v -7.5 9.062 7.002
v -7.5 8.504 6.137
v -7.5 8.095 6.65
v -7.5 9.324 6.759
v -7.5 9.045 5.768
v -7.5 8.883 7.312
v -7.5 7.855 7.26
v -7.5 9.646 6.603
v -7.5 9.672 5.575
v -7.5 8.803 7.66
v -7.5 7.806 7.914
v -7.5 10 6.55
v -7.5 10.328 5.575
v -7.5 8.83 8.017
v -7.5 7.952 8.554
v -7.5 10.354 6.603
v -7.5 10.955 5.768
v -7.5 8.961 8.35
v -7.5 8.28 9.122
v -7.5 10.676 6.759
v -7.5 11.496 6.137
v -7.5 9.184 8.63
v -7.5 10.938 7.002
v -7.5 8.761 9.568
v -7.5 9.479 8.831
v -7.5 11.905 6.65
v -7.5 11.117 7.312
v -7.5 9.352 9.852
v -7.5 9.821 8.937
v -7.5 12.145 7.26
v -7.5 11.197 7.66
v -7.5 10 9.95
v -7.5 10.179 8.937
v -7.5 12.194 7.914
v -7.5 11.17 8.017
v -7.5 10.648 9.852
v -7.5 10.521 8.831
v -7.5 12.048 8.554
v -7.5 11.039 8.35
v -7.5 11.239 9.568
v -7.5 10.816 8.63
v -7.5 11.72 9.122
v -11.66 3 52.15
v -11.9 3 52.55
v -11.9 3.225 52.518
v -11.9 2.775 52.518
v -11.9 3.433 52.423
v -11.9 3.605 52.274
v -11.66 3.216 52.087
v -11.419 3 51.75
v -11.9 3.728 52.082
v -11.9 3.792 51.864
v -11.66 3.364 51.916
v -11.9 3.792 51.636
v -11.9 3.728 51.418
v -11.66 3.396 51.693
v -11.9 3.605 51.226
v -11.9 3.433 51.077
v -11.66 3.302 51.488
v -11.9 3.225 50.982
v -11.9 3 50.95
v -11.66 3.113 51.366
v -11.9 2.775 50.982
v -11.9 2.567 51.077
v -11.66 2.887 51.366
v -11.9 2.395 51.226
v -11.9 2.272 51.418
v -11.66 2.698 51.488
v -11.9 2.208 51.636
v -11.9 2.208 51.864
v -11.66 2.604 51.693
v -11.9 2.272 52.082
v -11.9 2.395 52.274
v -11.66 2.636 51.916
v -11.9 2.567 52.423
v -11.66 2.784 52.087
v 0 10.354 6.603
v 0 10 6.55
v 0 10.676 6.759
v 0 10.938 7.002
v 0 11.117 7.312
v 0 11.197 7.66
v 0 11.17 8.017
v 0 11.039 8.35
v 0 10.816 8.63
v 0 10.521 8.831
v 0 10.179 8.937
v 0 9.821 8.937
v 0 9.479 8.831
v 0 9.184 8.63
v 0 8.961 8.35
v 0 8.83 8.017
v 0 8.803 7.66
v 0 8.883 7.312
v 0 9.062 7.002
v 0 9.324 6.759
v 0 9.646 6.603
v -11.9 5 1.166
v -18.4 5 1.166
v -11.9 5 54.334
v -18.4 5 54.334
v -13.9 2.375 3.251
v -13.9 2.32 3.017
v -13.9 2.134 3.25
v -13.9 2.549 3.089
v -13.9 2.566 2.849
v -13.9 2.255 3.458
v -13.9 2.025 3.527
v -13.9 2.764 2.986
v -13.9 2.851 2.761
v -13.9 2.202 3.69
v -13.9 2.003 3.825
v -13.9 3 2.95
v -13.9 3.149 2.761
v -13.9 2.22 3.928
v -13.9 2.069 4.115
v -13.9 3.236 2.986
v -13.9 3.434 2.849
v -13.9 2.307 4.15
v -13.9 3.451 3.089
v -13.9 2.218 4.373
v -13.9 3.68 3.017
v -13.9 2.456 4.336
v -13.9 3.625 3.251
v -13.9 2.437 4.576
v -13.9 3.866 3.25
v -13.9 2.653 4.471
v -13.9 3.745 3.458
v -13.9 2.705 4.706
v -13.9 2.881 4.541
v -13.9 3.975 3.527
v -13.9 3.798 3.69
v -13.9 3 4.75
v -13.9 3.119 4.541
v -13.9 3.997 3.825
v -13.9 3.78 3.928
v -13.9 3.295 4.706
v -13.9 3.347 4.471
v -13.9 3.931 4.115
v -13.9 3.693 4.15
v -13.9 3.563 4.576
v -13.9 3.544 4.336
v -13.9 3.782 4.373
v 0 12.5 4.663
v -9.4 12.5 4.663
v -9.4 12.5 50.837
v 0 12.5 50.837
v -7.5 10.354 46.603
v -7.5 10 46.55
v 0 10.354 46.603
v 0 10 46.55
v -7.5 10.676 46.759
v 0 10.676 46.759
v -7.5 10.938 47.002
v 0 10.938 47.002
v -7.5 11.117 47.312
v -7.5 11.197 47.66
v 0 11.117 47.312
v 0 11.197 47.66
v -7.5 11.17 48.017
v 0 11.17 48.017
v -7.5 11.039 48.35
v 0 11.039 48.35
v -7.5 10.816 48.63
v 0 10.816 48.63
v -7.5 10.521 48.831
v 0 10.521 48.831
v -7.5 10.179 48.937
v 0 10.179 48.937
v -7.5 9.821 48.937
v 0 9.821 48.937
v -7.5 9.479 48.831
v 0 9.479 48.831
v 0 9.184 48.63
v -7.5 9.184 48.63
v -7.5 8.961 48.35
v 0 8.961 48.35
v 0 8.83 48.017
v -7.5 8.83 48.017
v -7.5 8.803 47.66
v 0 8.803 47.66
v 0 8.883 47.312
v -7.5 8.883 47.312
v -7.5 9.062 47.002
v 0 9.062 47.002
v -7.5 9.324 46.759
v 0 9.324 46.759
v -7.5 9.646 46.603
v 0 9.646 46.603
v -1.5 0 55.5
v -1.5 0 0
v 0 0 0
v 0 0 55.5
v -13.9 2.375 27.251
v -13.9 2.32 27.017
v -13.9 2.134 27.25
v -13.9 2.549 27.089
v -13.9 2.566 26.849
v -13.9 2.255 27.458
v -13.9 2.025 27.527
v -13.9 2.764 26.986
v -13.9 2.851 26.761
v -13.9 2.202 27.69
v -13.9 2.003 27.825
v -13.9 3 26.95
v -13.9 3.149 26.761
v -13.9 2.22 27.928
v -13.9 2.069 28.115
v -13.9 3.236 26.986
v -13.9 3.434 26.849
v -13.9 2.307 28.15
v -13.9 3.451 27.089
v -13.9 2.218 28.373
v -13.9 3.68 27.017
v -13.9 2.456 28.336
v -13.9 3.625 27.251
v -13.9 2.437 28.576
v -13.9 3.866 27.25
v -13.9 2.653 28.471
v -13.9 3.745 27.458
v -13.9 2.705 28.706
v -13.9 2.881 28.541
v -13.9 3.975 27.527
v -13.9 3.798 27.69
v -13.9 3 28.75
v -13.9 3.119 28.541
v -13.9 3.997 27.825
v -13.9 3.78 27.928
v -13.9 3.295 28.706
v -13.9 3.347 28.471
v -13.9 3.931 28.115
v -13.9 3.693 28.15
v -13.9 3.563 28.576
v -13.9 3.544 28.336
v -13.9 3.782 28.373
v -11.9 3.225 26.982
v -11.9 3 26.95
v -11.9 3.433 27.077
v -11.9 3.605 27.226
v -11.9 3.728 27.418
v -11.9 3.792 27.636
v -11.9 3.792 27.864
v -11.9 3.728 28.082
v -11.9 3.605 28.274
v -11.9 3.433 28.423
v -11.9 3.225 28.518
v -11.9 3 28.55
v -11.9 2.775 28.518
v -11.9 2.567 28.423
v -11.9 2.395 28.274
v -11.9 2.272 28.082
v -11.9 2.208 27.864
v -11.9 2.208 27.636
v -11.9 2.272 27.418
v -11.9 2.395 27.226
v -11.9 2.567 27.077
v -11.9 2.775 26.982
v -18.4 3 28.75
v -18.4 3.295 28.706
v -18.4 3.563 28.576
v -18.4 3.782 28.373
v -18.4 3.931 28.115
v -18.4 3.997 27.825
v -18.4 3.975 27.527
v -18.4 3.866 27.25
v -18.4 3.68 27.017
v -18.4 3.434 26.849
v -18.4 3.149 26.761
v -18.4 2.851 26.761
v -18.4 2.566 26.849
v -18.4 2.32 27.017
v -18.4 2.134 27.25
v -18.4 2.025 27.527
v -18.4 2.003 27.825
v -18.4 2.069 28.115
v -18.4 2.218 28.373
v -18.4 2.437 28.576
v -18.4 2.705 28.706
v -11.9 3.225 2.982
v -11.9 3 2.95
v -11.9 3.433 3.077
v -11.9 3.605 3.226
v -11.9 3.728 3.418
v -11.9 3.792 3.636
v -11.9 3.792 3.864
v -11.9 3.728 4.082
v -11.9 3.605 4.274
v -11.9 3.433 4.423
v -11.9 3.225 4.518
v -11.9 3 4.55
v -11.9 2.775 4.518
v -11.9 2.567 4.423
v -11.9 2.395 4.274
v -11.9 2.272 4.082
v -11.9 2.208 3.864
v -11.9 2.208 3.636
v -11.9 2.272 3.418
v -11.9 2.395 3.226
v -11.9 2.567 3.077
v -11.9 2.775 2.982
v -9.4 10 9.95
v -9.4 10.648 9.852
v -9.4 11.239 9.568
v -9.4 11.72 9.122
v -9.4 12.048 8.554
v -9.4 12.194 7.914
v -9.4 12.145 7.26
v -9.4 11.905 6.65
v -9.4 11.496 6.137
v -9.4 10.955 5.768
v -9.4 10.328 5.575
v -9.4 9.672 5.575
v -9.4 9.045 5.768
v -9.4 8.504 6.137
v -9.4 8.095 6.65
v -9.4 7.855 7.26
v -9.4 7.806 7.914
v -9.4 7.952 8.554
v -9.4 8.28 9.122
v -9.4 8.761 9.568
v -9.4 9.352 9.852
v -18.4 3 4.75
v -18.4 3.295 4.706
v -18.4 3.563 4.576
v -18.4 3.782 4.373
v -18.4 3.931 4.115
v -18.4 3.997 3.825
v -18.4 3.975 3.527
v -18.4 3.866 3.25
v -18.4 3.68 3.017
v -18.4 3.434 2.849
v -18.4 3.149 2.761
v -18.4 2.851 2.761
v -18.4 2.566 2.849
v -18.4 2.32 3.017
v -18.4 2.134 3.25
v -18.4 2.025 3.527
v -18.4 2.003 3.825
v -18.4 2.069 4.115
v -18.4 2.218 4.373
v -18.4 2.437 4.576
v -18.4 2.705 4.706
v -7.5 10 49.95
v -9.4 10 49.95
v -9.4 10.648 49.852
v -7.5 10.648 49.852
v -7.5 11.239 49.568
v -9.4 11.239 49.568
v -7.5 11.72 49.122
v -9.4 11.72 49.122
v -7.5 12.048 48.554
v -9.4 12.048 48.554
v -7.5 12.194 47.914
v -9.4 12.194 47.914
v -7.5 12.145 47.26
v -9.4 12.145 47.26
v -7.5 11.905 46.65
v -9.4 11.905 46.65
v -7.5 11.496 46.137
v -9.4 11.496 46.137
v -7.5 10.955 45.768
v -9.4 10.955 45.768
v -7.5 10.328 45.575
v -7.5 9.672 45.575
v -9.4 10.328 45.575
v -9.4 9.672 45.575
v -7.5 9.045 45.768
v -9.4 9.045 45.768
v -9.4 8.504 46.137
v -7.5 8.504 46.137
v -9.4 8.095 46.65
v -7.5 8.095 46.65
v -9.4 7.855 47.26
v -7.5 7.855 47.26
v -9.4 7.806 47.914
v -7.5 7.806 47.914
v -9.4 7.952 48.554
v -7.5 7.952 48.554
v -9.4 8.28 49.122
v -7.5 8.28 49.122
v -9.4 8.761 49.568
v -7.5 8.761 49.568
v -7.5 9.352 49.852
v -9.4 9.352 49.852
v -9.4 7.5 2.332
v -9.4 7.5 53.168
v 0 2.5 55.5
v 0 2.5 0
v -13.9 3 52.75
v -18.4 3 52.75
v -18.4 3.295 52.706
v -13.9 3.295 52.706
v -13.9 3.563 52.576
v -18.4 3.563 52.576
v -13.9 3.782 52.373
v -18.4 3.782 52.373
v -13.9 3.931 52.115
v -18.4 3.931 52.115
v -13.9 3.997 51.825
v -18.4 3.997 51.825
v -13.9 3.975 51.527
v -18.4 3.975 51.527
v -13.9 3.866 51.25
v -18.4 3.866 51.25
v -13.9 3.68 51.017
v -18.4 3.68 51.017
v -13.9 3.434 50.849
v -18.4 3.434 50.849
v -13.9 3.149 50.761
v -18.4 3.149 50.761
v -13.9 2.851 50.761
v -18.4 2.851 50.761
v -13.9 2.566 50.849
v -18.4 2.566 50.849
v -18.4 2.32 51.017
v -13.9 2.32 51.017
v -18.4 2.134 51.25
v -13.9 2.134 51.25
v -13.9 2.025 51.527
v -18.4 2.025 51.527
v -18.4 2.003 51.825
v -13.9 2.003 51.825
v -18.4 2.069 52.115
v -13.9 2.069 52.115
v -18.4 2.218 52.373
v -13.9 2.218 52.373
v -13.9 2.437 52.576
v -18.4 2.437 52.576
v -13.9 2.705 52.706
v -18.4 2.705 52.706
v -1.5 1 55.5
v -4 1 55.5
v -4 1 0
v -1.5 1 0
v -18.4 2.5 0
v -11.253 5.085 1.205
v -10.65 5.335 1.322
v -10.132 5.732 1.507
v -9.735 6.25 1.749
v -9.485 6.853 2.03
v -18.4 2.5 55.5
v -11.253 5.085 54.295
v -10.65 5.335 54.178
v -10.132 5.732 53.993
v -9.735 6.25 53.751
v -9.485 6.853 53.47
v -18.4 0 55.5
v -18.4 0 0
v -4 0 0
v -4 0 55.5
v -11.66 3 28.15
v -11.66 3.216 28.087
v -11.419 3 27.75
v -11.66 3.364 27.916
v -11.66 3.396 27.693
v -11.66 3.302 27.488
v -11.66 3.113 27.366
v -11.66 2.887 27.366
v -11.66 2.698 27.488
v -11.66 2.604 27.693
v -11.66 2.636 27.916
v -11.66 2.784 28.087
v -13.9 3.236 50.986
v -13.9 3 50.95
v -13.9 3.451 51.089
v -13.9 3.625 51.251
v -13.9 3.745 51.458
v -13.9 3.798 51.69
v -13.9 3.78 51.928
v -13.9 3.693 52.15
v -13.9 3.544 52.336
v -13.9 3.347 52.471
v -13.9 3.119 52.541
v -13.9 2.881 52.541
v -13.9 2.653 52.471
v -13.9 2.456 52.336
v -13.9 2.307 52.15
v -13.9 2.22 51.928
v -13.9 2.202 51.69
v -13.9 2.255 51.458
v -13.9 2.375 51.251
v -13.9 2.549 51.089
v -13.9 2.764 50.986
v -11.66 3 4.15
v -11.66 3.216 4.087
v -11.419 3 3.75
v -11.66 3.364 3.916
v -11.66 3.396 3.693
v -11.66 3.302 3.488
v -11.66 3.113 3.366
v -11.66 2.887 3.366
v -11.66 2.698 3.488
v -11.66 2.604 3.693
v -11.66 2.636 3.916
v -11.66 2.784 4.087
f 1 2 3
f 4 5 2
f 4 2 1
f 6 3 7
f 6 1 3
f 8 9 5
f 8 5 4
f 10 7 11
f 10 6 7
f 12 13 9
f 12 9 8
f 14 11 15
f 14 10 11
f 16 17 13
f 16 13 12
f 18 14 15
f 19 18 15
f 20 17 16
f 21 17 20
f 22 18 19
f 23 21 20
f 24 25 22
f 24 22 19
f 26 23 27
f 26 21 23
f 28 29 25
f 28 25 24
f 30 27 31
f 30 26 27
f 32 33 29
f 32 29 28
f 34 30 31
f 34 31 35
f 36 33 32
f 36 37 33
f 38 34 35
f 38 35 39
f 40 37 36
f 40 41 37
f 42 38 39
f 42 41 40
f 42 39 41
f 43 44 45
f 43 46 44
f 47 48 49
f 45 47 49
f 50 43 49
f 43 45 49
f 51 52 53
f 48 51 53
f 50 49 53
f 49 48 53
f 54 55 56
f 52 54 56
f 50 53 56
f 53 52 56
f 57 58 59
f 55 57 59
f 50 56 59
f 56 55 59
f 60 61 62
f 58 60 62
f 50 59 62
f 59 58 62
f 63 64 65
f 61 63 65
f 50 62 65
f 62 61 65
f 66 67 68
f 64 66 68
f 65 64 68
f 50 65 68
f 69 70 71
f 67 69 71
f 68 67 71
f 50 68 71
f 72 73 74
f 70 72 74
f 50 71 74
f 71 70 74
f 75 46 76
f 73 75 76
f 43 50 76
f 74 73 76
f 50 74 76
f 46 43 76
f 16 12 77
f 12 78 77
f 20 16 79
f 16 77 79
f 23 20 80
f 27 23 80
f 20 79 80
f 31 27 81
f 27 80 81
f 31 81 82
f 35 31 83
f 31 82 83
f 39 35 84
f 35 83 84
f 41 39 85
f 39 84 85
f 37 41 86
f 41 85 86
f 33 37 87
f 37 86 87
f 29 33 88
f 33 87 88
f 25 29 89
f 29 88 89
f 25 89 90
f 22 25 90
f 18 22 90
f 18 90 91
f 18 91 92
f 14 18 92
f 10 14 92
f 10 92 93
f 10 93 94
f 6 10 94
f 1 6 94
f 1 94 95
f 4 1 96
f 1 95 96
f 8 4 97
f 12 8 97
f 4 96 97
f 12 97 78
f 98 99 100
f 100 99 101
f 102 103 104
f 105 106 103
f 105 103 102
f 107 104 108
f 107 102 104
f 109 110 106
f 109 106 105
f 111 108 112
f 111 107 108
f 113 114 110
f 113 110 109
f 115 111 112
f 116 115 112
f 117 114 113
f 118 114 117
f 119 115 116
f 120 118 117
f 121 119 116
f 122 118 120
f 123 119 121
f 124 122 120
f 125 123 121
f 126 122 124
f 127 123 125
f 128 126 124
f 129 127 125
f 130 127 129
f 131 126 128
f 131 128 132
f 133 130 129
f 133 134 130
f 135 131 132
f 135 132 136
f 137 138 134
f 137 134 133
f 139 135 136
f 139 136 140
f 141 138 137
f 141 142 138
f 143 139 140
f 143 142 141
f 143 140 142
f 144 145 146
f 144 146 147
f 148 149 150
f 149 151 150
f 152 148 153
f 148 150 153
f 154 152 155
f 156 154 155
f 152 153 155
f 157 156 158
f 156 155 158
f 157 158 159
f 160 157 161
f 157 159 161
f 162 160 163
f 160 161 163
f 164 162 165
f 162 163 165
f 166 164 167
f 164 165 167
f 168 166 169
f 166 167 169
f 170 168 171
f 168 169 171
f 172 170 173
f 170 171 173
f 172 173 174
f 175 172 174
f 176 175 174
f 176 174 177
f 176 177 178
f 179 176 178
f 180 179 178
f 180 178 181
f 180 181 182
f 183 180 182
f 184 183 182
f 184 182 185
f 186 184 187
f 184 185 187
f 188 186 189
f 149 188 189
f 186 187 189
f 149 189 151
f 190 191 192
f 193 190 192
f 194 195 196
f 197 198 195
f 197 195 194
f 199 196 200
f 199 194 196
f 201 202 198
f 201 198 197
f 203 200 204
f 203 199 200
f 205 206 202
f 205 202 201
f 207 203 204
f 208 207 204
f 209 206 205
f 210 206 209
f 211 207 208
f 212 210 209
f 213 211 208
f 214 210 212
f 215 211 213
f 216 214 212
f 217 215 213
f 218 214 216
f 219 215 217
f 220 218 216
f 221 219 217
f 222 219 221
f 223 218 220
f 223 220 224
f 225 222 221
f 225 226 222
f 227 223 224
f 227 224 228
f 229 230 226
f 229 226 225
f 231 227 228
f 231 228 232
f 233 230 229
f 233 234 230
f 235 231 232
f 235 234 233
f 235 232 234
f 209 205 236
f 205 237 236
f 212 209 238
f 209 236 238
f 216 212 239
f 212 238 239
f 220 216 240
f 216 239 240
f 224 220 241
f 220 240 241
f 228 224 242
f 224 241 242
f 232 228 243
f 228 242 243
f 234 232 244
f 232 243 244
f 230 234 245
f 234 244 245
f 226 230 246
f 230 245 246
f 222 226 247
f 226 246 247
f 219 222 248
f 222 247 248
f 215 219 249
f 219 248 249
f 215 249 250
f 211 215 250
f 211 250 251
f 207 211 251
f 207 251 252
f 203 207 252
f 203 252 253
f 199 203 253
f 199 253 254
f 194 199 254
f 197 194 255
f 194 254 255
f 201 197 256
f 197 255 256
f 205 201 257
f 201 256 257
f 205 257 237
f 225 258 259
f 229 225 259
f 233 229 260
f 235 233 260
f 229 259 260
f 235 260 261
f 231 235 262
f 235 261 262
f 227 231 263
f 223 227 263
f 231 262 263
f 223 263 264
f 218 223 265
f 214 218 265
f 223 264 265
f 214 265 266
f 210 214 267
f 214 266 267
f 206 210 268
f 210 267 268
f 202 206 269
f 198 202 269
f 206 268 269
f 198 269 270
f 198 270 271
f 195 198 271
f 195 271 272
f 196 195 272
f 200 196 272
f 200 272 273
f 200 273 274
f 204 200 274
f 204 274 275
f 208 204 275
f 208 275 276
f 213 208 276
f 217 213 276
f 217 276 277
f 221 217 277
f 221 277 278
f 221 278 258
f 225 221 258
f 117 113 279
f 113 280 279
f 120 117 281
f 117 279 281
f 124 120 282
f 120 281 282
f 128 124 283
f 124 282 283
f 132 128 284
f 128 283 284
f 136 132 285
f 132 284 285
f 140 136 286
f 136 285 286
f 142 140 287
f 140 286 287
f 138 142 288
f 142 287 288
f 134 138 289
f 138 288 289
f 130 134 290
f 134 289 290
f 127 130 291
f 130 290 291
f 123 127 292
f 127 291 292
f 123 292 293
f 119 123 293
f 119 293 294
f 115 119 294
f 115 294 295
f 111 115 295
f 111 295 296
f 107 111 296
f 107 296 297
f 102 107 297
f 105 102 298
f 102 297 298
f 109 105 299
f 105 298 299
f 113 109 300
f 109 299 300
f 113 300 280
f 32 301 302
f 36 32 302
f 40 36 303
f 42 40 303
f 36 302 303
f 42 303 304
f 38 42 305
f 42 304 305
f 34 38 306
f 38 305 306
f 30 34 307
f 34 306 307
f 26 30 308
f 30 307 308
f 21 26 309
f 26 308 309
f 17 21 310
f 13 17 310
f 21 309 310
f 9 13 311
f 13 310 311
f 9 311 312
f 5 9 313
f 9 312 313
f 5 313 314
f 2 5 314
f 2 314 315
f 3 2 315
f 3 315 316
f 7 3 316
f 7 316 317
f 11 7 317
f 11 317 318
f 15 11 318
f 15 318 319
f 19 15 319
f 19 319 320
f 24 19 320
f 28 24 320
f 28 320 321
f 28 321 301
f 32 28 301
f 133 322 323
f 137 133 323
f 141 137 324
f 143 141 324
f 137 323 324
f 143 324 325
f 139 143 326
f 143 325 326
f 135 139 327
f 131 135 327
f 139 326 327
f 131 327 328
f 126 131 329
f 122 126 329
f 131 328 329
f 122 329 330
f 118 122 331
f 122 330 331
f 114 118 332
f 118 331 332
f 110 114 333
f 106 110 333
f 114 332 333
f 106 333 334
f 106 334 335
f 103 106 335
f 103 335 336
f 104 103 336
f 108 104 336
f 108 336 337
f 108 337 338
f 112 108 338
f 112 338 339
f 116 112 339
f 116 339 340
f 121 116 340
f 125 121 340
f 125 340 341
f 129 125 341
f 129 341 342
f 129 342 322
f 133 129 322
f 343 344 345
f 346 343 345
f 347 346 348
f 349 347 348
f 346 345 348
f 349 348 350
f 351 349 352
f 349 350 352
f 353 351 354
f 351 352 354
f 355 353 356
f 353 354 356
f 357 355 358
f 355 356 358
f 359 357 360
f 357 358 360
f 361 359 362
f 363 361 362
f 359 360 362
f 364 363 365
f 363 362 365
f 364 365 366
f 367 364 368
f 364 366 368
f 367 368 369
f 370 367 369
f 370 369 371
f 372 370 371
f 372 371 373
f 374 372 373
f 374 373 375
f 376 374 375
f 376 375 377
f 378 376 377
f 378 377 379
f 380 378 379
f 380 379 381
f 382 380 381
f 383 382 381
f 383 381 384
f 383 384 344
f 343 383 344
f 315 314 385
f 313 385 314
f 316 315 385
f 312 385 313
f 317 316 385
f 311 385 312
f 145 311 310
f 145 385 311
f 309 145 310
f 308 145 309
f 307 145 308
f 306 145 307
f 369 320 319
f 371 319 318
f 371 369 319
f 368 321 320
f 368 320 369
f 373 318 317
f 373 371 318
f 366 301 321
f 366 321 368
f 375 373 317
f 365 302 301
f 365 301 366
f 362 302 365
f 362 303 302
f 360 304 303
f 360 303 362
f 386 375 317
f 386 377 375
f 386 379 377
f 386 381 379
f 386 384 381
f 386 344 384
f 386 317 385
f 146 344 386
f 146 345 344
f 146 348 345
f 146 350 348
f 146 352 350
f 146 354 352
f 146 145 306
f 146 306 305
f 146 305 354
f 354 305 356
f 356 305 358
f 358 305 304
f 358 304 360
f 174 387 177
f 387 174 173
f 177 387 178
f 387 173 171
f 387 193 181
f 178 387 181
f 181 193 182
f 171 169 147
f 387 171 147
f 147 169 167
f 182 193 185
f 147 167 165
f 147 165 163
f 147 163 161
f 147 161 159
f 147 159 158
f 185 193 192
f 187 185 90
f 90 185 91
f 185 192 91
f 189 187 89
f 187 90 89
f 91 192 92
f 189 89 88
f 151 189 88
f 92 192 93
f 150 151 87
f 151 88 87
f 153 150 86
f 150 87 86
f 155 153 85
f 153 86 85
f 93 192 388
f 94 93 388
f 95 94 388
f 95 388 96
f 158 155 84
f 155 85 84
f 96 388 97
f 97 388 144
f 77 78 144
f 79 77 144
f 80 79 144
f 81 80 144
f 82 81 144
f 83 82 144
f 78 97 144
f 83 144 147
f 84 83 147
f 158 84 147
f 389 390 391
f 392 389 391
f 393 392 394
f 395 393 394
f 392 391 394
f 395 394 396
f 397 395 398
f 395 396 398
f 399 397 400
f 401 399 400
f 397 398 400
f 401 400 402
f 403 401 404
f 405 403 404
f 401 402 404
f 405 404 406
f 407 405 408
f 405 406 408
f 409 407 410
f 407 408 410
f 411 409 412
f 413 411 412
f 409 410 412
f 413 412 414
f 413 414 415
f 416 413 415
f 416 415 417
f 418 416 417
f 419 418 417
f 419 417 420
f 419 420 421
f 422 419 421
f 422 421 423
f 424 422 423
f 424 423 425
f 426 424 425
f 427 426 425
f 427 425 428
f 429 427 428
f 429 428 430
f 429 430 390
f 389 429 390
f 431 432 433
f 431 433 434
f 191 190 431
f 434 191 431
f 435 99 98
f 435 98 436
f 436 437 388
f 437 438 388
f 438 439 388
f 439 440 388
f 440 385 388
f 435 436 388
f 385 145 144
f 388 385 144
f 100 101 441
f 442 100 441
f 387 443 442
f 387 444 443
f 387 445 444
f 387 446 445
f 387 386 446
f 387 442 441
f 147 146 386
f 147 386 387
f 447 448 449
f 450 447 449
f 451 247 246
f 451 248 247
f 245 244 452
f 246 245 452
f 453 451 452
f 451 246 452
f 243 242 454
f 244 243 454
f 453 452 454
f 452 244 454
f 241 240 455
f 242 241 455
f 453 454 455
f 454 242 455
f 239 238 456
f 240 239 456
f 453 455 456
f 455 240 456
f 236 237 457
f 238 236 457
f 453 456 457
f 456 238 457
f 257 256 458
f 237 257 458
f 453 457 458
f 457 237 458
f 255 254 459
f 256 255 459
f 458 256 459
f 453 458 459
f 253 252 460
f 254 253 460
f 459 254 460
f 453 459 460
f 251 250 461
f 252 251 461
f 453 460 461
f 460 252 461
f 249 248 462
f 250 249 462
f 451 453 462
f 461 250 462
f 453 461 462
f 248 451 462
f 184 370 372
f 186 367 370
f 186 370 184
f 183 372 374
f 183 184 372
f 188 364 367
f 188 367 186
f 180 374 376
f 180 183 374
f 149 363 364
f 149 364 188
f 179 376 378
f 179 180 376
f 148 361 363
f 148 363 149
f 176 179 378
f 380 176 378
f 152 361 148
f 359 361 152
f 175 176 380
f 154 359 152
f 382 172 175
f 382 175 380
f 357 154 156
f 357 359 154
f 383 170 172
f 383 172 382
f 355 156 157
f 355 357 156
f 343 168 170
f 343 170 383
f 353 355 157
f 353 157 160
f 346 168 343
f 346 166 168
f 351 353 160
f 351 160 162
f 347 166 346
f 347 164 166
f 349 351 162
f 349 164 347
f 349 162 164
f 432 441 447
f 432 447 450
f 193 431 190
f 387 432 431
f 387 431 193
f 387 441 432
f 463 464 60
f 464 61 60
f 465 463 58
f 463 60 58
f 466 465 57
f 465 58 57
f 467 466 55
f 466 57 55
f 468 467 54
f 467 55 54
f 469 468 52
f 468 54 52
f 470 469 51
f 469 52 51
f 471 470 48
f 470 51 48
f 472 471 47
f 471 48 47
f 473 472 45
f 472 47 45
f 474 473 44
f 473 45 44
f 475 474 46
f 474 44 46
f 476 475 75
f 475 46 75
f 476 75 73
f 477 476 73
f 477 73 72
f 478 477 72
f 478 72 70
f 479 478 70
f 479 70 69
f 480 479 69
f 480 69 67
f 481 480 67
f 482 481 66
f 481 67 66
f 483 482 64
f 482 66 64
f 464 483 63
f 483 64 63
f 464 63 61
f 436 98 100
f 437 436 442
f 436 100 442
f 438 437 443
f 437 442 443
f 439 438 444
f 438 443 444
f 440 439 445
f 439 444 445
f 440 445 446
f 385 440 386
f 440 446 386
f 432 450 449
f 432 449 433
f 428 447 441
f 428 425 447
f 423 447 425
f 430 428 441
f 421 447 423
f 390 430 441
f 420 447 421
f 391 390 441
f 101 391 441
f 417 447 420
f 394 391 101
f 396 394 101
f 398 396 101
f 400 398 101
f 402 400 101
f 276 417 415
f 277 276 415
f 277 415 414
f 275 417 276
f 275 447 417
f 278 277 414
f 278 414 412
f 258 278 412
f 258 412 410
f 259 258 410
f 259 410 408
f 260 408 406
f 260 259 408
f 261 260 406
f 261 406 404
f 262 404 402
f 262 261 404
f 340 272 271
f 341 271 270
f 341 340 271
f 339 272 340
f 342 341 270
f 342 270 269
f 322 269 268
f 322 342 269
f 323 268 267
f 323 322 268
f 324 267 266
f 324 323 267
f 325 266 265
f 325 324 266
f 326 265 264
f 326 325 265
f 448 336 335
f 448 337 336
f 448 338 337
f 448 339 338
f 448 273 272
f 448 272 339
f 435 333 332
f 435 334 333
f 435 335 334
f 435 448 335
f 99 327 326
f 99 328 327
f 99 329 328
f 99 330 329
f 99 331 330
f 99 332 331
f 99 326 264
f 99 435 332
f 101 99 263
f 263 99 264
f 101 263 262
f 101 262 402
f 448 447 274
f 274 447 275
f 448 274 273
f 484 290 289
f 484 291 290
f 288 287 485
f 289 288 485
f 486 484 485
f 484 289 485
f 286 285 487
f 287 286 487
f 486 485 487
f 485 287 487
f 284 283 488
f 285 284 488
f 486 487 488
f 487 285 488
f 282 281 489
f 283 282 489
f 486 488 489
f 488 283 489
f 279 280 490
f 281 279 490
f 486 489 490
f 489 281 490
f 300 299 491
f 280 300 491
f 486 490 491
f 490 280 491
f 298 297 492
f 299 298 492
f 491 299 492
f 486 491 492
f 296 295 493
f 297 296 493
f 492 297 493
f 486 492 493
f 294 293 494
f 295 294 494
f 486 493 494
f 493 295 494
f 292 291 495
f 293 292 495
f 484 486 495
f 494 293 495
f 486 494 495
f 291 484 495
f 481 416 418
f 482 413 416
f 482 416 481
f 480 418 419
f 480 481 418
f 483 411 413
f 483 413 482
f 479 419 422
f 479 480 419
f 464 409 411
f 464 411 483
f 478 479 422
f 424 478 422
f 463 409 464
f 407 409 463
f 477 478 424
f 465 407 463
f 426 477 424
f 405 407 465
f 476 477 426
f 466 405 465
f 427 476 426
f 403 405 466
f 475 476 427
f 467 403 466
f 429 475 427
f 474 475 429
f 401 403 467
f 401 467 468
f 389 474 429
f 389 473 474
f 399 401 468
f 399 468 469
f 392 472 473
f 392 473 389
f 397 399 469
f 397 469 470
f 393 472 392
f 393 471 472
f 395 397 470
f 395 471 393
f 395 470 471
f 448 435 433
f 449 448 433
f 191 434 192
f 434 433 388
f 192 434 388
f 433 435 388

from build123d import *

# Parameters (mm, degrees)
SKETCH1_W                       = 18.4
SKETCH1_H                       = 12.5
BOSS_EXTRUDE1_DEPTH             = 55.5
SKETCH2_W                       = 2.5
SKETCH2_H                       = 1
CUT_EXTRUDE1_DEPTH              = 56.5
M2X0_4_TAPPED_HOLE1_D           = 1.6
M2X0_4_TAPPED_HOLE1_DEPTH       = 6.5
M2X0_4_TAPPED_HOLE1_CBORE_D     = 2
M2X0_4_TAPPED_HOLE1_CBORE_DEPTH = 4.5
M2X0_4_TAPPED_HOLE1_TIP         = 0.480688495
CBORE_FOR_M2_SHCS1_D            = 2.4
CBORE_FOR_M2_SHCS1_CBORE_D      = 4.4
CBORE_FOR_M2_SHCS1_CBORE_DEPTH  = 10.9
CHAMFER1_SIZE                   = 10
CHAMFER1_SIZE2                  = 4.663076582
CHAMFER2_SIZE                   = 10
CHAMFER2_SIZE2                  = 4.663076582
SKETCH7_W                       = 55.5
SKETCH7_H                       = 7.5
CUT_EXTRUDE2_DEPTH              = 9
FILLET2_R                       = 2.5


with BuildPart() as part:
    # Sketch1 → Boss-Extrude1 (new body)
    with BuildSketch(Plane.XY):
        with Locations((-9.2, 6.25)):
            Rectangle(SKETCH1_W, SKETCH1_H)
    extrude(amount=BOSS_EXTRUDE1_DEPTH)

    # Sketch2 → Cut-Extrude1 (cut, through all)
    with BuildSketch(Plane.XY.offset(55.5)):
        with Locations((-2.75, 0.5)):
            Rectangle(SKETCH2_W, SKETCH2_H)
    extrude(amount=-CUT_EXTRUDE1_DEPTH, mode=Mode.SUBTRACT)

    # M2x0.4 Tapped Hole1
    with Locations(Plane.ZY.offset(18.4)):
        with Locations((51.75, 3), (27.75, 3), (3.75, 3)):
            CounterBoreHole(M2X0_4_TAPPED_HOLE1_D / 2, M2X0_4_TAPPED_HOLE1_CBORE_D / 2, M2X0_4_TAPPED_HOLE1_CBORE_DEPTH, depth=M2X0_4_TAPPED_HOLE1_DEPTH)
            with Locations((0, 0, -(M2X0_4_TAPPED_HOLE1_DEPTH + M2X0_4_TAPPED_HOLE1_TIP / 2))):  # 118° drill point
                Cone(0, M2X0_4_TAPPED_HOLE1_D / 2, M2X0_4_TAPPED_HOLE1_TIP, mode=Mode.SUBTRACT)

    # CBORE for M2 SHCS1 (through all)
    with Locations(Plane.ZY.offset(18.4)):
        with Locations((47.75, 10), (7.75, 10)):
            CounterBoreHole(CBORE_FOR_M2_SHCS1_D / 2, CBORE_FOR_M2_SHCS1_CBORE_D / 2, CBORE_FOR_M2_SHCS1_CBORE_DEPTH)

    # Chamfer1
    chamfer1_edges = [part.edges().sort_by_distance(p)[0] for p in [
        (-9.2, 12.5, 0),
    ]]
    chamfer1_side = [part.faces().sort_by_distance(p)[0] for p in [
        (-9.270879121, 6.313186813, 0),
    ]]
    chamfer(chamfer1_edges, length=CHAMFER1_SIZE, length2=CHAMFER1_SIZE2, reference=chamfer1_side[0])

    # Chamfer2
    chamfer2_edges = [part.edges().sort_by_distance(p)[0] for p in [
        (-9.2, 12.5, 55.5),
    ]]
    chamfer2_side = [part.faces().sort_by_distance(p)[0] for p in [
        (-9.270879121, 6.313186813, 55.5),
    ]]
    chamfer(chamfer2_edges, length=CHAMFER2_SIZE, length2=CHAMFER2_SIZE2, reference=chamfer2_side[0])

    # Sketch7 → Cut-Extrude2 (cut)
    with BuildSketch(Plane.ZY.offset(18.4)):
        with Locations((27.75, 8.75)):
            Rectangle(SKETCH7_W, SKETCH7_H)
    extrude(amount=-CUT_EXTRUDE2_DEPTH, mode=Mode.SUBTRACT)

    # Fillet2
    fillet2_edges = [part.edges().sort_by_distance(p)[0] for p in [
        (-9.4, 5, 27.75),
    ]]
    fillet(fillet2_edges, radius=FILLET2_R)


solid = part.part
